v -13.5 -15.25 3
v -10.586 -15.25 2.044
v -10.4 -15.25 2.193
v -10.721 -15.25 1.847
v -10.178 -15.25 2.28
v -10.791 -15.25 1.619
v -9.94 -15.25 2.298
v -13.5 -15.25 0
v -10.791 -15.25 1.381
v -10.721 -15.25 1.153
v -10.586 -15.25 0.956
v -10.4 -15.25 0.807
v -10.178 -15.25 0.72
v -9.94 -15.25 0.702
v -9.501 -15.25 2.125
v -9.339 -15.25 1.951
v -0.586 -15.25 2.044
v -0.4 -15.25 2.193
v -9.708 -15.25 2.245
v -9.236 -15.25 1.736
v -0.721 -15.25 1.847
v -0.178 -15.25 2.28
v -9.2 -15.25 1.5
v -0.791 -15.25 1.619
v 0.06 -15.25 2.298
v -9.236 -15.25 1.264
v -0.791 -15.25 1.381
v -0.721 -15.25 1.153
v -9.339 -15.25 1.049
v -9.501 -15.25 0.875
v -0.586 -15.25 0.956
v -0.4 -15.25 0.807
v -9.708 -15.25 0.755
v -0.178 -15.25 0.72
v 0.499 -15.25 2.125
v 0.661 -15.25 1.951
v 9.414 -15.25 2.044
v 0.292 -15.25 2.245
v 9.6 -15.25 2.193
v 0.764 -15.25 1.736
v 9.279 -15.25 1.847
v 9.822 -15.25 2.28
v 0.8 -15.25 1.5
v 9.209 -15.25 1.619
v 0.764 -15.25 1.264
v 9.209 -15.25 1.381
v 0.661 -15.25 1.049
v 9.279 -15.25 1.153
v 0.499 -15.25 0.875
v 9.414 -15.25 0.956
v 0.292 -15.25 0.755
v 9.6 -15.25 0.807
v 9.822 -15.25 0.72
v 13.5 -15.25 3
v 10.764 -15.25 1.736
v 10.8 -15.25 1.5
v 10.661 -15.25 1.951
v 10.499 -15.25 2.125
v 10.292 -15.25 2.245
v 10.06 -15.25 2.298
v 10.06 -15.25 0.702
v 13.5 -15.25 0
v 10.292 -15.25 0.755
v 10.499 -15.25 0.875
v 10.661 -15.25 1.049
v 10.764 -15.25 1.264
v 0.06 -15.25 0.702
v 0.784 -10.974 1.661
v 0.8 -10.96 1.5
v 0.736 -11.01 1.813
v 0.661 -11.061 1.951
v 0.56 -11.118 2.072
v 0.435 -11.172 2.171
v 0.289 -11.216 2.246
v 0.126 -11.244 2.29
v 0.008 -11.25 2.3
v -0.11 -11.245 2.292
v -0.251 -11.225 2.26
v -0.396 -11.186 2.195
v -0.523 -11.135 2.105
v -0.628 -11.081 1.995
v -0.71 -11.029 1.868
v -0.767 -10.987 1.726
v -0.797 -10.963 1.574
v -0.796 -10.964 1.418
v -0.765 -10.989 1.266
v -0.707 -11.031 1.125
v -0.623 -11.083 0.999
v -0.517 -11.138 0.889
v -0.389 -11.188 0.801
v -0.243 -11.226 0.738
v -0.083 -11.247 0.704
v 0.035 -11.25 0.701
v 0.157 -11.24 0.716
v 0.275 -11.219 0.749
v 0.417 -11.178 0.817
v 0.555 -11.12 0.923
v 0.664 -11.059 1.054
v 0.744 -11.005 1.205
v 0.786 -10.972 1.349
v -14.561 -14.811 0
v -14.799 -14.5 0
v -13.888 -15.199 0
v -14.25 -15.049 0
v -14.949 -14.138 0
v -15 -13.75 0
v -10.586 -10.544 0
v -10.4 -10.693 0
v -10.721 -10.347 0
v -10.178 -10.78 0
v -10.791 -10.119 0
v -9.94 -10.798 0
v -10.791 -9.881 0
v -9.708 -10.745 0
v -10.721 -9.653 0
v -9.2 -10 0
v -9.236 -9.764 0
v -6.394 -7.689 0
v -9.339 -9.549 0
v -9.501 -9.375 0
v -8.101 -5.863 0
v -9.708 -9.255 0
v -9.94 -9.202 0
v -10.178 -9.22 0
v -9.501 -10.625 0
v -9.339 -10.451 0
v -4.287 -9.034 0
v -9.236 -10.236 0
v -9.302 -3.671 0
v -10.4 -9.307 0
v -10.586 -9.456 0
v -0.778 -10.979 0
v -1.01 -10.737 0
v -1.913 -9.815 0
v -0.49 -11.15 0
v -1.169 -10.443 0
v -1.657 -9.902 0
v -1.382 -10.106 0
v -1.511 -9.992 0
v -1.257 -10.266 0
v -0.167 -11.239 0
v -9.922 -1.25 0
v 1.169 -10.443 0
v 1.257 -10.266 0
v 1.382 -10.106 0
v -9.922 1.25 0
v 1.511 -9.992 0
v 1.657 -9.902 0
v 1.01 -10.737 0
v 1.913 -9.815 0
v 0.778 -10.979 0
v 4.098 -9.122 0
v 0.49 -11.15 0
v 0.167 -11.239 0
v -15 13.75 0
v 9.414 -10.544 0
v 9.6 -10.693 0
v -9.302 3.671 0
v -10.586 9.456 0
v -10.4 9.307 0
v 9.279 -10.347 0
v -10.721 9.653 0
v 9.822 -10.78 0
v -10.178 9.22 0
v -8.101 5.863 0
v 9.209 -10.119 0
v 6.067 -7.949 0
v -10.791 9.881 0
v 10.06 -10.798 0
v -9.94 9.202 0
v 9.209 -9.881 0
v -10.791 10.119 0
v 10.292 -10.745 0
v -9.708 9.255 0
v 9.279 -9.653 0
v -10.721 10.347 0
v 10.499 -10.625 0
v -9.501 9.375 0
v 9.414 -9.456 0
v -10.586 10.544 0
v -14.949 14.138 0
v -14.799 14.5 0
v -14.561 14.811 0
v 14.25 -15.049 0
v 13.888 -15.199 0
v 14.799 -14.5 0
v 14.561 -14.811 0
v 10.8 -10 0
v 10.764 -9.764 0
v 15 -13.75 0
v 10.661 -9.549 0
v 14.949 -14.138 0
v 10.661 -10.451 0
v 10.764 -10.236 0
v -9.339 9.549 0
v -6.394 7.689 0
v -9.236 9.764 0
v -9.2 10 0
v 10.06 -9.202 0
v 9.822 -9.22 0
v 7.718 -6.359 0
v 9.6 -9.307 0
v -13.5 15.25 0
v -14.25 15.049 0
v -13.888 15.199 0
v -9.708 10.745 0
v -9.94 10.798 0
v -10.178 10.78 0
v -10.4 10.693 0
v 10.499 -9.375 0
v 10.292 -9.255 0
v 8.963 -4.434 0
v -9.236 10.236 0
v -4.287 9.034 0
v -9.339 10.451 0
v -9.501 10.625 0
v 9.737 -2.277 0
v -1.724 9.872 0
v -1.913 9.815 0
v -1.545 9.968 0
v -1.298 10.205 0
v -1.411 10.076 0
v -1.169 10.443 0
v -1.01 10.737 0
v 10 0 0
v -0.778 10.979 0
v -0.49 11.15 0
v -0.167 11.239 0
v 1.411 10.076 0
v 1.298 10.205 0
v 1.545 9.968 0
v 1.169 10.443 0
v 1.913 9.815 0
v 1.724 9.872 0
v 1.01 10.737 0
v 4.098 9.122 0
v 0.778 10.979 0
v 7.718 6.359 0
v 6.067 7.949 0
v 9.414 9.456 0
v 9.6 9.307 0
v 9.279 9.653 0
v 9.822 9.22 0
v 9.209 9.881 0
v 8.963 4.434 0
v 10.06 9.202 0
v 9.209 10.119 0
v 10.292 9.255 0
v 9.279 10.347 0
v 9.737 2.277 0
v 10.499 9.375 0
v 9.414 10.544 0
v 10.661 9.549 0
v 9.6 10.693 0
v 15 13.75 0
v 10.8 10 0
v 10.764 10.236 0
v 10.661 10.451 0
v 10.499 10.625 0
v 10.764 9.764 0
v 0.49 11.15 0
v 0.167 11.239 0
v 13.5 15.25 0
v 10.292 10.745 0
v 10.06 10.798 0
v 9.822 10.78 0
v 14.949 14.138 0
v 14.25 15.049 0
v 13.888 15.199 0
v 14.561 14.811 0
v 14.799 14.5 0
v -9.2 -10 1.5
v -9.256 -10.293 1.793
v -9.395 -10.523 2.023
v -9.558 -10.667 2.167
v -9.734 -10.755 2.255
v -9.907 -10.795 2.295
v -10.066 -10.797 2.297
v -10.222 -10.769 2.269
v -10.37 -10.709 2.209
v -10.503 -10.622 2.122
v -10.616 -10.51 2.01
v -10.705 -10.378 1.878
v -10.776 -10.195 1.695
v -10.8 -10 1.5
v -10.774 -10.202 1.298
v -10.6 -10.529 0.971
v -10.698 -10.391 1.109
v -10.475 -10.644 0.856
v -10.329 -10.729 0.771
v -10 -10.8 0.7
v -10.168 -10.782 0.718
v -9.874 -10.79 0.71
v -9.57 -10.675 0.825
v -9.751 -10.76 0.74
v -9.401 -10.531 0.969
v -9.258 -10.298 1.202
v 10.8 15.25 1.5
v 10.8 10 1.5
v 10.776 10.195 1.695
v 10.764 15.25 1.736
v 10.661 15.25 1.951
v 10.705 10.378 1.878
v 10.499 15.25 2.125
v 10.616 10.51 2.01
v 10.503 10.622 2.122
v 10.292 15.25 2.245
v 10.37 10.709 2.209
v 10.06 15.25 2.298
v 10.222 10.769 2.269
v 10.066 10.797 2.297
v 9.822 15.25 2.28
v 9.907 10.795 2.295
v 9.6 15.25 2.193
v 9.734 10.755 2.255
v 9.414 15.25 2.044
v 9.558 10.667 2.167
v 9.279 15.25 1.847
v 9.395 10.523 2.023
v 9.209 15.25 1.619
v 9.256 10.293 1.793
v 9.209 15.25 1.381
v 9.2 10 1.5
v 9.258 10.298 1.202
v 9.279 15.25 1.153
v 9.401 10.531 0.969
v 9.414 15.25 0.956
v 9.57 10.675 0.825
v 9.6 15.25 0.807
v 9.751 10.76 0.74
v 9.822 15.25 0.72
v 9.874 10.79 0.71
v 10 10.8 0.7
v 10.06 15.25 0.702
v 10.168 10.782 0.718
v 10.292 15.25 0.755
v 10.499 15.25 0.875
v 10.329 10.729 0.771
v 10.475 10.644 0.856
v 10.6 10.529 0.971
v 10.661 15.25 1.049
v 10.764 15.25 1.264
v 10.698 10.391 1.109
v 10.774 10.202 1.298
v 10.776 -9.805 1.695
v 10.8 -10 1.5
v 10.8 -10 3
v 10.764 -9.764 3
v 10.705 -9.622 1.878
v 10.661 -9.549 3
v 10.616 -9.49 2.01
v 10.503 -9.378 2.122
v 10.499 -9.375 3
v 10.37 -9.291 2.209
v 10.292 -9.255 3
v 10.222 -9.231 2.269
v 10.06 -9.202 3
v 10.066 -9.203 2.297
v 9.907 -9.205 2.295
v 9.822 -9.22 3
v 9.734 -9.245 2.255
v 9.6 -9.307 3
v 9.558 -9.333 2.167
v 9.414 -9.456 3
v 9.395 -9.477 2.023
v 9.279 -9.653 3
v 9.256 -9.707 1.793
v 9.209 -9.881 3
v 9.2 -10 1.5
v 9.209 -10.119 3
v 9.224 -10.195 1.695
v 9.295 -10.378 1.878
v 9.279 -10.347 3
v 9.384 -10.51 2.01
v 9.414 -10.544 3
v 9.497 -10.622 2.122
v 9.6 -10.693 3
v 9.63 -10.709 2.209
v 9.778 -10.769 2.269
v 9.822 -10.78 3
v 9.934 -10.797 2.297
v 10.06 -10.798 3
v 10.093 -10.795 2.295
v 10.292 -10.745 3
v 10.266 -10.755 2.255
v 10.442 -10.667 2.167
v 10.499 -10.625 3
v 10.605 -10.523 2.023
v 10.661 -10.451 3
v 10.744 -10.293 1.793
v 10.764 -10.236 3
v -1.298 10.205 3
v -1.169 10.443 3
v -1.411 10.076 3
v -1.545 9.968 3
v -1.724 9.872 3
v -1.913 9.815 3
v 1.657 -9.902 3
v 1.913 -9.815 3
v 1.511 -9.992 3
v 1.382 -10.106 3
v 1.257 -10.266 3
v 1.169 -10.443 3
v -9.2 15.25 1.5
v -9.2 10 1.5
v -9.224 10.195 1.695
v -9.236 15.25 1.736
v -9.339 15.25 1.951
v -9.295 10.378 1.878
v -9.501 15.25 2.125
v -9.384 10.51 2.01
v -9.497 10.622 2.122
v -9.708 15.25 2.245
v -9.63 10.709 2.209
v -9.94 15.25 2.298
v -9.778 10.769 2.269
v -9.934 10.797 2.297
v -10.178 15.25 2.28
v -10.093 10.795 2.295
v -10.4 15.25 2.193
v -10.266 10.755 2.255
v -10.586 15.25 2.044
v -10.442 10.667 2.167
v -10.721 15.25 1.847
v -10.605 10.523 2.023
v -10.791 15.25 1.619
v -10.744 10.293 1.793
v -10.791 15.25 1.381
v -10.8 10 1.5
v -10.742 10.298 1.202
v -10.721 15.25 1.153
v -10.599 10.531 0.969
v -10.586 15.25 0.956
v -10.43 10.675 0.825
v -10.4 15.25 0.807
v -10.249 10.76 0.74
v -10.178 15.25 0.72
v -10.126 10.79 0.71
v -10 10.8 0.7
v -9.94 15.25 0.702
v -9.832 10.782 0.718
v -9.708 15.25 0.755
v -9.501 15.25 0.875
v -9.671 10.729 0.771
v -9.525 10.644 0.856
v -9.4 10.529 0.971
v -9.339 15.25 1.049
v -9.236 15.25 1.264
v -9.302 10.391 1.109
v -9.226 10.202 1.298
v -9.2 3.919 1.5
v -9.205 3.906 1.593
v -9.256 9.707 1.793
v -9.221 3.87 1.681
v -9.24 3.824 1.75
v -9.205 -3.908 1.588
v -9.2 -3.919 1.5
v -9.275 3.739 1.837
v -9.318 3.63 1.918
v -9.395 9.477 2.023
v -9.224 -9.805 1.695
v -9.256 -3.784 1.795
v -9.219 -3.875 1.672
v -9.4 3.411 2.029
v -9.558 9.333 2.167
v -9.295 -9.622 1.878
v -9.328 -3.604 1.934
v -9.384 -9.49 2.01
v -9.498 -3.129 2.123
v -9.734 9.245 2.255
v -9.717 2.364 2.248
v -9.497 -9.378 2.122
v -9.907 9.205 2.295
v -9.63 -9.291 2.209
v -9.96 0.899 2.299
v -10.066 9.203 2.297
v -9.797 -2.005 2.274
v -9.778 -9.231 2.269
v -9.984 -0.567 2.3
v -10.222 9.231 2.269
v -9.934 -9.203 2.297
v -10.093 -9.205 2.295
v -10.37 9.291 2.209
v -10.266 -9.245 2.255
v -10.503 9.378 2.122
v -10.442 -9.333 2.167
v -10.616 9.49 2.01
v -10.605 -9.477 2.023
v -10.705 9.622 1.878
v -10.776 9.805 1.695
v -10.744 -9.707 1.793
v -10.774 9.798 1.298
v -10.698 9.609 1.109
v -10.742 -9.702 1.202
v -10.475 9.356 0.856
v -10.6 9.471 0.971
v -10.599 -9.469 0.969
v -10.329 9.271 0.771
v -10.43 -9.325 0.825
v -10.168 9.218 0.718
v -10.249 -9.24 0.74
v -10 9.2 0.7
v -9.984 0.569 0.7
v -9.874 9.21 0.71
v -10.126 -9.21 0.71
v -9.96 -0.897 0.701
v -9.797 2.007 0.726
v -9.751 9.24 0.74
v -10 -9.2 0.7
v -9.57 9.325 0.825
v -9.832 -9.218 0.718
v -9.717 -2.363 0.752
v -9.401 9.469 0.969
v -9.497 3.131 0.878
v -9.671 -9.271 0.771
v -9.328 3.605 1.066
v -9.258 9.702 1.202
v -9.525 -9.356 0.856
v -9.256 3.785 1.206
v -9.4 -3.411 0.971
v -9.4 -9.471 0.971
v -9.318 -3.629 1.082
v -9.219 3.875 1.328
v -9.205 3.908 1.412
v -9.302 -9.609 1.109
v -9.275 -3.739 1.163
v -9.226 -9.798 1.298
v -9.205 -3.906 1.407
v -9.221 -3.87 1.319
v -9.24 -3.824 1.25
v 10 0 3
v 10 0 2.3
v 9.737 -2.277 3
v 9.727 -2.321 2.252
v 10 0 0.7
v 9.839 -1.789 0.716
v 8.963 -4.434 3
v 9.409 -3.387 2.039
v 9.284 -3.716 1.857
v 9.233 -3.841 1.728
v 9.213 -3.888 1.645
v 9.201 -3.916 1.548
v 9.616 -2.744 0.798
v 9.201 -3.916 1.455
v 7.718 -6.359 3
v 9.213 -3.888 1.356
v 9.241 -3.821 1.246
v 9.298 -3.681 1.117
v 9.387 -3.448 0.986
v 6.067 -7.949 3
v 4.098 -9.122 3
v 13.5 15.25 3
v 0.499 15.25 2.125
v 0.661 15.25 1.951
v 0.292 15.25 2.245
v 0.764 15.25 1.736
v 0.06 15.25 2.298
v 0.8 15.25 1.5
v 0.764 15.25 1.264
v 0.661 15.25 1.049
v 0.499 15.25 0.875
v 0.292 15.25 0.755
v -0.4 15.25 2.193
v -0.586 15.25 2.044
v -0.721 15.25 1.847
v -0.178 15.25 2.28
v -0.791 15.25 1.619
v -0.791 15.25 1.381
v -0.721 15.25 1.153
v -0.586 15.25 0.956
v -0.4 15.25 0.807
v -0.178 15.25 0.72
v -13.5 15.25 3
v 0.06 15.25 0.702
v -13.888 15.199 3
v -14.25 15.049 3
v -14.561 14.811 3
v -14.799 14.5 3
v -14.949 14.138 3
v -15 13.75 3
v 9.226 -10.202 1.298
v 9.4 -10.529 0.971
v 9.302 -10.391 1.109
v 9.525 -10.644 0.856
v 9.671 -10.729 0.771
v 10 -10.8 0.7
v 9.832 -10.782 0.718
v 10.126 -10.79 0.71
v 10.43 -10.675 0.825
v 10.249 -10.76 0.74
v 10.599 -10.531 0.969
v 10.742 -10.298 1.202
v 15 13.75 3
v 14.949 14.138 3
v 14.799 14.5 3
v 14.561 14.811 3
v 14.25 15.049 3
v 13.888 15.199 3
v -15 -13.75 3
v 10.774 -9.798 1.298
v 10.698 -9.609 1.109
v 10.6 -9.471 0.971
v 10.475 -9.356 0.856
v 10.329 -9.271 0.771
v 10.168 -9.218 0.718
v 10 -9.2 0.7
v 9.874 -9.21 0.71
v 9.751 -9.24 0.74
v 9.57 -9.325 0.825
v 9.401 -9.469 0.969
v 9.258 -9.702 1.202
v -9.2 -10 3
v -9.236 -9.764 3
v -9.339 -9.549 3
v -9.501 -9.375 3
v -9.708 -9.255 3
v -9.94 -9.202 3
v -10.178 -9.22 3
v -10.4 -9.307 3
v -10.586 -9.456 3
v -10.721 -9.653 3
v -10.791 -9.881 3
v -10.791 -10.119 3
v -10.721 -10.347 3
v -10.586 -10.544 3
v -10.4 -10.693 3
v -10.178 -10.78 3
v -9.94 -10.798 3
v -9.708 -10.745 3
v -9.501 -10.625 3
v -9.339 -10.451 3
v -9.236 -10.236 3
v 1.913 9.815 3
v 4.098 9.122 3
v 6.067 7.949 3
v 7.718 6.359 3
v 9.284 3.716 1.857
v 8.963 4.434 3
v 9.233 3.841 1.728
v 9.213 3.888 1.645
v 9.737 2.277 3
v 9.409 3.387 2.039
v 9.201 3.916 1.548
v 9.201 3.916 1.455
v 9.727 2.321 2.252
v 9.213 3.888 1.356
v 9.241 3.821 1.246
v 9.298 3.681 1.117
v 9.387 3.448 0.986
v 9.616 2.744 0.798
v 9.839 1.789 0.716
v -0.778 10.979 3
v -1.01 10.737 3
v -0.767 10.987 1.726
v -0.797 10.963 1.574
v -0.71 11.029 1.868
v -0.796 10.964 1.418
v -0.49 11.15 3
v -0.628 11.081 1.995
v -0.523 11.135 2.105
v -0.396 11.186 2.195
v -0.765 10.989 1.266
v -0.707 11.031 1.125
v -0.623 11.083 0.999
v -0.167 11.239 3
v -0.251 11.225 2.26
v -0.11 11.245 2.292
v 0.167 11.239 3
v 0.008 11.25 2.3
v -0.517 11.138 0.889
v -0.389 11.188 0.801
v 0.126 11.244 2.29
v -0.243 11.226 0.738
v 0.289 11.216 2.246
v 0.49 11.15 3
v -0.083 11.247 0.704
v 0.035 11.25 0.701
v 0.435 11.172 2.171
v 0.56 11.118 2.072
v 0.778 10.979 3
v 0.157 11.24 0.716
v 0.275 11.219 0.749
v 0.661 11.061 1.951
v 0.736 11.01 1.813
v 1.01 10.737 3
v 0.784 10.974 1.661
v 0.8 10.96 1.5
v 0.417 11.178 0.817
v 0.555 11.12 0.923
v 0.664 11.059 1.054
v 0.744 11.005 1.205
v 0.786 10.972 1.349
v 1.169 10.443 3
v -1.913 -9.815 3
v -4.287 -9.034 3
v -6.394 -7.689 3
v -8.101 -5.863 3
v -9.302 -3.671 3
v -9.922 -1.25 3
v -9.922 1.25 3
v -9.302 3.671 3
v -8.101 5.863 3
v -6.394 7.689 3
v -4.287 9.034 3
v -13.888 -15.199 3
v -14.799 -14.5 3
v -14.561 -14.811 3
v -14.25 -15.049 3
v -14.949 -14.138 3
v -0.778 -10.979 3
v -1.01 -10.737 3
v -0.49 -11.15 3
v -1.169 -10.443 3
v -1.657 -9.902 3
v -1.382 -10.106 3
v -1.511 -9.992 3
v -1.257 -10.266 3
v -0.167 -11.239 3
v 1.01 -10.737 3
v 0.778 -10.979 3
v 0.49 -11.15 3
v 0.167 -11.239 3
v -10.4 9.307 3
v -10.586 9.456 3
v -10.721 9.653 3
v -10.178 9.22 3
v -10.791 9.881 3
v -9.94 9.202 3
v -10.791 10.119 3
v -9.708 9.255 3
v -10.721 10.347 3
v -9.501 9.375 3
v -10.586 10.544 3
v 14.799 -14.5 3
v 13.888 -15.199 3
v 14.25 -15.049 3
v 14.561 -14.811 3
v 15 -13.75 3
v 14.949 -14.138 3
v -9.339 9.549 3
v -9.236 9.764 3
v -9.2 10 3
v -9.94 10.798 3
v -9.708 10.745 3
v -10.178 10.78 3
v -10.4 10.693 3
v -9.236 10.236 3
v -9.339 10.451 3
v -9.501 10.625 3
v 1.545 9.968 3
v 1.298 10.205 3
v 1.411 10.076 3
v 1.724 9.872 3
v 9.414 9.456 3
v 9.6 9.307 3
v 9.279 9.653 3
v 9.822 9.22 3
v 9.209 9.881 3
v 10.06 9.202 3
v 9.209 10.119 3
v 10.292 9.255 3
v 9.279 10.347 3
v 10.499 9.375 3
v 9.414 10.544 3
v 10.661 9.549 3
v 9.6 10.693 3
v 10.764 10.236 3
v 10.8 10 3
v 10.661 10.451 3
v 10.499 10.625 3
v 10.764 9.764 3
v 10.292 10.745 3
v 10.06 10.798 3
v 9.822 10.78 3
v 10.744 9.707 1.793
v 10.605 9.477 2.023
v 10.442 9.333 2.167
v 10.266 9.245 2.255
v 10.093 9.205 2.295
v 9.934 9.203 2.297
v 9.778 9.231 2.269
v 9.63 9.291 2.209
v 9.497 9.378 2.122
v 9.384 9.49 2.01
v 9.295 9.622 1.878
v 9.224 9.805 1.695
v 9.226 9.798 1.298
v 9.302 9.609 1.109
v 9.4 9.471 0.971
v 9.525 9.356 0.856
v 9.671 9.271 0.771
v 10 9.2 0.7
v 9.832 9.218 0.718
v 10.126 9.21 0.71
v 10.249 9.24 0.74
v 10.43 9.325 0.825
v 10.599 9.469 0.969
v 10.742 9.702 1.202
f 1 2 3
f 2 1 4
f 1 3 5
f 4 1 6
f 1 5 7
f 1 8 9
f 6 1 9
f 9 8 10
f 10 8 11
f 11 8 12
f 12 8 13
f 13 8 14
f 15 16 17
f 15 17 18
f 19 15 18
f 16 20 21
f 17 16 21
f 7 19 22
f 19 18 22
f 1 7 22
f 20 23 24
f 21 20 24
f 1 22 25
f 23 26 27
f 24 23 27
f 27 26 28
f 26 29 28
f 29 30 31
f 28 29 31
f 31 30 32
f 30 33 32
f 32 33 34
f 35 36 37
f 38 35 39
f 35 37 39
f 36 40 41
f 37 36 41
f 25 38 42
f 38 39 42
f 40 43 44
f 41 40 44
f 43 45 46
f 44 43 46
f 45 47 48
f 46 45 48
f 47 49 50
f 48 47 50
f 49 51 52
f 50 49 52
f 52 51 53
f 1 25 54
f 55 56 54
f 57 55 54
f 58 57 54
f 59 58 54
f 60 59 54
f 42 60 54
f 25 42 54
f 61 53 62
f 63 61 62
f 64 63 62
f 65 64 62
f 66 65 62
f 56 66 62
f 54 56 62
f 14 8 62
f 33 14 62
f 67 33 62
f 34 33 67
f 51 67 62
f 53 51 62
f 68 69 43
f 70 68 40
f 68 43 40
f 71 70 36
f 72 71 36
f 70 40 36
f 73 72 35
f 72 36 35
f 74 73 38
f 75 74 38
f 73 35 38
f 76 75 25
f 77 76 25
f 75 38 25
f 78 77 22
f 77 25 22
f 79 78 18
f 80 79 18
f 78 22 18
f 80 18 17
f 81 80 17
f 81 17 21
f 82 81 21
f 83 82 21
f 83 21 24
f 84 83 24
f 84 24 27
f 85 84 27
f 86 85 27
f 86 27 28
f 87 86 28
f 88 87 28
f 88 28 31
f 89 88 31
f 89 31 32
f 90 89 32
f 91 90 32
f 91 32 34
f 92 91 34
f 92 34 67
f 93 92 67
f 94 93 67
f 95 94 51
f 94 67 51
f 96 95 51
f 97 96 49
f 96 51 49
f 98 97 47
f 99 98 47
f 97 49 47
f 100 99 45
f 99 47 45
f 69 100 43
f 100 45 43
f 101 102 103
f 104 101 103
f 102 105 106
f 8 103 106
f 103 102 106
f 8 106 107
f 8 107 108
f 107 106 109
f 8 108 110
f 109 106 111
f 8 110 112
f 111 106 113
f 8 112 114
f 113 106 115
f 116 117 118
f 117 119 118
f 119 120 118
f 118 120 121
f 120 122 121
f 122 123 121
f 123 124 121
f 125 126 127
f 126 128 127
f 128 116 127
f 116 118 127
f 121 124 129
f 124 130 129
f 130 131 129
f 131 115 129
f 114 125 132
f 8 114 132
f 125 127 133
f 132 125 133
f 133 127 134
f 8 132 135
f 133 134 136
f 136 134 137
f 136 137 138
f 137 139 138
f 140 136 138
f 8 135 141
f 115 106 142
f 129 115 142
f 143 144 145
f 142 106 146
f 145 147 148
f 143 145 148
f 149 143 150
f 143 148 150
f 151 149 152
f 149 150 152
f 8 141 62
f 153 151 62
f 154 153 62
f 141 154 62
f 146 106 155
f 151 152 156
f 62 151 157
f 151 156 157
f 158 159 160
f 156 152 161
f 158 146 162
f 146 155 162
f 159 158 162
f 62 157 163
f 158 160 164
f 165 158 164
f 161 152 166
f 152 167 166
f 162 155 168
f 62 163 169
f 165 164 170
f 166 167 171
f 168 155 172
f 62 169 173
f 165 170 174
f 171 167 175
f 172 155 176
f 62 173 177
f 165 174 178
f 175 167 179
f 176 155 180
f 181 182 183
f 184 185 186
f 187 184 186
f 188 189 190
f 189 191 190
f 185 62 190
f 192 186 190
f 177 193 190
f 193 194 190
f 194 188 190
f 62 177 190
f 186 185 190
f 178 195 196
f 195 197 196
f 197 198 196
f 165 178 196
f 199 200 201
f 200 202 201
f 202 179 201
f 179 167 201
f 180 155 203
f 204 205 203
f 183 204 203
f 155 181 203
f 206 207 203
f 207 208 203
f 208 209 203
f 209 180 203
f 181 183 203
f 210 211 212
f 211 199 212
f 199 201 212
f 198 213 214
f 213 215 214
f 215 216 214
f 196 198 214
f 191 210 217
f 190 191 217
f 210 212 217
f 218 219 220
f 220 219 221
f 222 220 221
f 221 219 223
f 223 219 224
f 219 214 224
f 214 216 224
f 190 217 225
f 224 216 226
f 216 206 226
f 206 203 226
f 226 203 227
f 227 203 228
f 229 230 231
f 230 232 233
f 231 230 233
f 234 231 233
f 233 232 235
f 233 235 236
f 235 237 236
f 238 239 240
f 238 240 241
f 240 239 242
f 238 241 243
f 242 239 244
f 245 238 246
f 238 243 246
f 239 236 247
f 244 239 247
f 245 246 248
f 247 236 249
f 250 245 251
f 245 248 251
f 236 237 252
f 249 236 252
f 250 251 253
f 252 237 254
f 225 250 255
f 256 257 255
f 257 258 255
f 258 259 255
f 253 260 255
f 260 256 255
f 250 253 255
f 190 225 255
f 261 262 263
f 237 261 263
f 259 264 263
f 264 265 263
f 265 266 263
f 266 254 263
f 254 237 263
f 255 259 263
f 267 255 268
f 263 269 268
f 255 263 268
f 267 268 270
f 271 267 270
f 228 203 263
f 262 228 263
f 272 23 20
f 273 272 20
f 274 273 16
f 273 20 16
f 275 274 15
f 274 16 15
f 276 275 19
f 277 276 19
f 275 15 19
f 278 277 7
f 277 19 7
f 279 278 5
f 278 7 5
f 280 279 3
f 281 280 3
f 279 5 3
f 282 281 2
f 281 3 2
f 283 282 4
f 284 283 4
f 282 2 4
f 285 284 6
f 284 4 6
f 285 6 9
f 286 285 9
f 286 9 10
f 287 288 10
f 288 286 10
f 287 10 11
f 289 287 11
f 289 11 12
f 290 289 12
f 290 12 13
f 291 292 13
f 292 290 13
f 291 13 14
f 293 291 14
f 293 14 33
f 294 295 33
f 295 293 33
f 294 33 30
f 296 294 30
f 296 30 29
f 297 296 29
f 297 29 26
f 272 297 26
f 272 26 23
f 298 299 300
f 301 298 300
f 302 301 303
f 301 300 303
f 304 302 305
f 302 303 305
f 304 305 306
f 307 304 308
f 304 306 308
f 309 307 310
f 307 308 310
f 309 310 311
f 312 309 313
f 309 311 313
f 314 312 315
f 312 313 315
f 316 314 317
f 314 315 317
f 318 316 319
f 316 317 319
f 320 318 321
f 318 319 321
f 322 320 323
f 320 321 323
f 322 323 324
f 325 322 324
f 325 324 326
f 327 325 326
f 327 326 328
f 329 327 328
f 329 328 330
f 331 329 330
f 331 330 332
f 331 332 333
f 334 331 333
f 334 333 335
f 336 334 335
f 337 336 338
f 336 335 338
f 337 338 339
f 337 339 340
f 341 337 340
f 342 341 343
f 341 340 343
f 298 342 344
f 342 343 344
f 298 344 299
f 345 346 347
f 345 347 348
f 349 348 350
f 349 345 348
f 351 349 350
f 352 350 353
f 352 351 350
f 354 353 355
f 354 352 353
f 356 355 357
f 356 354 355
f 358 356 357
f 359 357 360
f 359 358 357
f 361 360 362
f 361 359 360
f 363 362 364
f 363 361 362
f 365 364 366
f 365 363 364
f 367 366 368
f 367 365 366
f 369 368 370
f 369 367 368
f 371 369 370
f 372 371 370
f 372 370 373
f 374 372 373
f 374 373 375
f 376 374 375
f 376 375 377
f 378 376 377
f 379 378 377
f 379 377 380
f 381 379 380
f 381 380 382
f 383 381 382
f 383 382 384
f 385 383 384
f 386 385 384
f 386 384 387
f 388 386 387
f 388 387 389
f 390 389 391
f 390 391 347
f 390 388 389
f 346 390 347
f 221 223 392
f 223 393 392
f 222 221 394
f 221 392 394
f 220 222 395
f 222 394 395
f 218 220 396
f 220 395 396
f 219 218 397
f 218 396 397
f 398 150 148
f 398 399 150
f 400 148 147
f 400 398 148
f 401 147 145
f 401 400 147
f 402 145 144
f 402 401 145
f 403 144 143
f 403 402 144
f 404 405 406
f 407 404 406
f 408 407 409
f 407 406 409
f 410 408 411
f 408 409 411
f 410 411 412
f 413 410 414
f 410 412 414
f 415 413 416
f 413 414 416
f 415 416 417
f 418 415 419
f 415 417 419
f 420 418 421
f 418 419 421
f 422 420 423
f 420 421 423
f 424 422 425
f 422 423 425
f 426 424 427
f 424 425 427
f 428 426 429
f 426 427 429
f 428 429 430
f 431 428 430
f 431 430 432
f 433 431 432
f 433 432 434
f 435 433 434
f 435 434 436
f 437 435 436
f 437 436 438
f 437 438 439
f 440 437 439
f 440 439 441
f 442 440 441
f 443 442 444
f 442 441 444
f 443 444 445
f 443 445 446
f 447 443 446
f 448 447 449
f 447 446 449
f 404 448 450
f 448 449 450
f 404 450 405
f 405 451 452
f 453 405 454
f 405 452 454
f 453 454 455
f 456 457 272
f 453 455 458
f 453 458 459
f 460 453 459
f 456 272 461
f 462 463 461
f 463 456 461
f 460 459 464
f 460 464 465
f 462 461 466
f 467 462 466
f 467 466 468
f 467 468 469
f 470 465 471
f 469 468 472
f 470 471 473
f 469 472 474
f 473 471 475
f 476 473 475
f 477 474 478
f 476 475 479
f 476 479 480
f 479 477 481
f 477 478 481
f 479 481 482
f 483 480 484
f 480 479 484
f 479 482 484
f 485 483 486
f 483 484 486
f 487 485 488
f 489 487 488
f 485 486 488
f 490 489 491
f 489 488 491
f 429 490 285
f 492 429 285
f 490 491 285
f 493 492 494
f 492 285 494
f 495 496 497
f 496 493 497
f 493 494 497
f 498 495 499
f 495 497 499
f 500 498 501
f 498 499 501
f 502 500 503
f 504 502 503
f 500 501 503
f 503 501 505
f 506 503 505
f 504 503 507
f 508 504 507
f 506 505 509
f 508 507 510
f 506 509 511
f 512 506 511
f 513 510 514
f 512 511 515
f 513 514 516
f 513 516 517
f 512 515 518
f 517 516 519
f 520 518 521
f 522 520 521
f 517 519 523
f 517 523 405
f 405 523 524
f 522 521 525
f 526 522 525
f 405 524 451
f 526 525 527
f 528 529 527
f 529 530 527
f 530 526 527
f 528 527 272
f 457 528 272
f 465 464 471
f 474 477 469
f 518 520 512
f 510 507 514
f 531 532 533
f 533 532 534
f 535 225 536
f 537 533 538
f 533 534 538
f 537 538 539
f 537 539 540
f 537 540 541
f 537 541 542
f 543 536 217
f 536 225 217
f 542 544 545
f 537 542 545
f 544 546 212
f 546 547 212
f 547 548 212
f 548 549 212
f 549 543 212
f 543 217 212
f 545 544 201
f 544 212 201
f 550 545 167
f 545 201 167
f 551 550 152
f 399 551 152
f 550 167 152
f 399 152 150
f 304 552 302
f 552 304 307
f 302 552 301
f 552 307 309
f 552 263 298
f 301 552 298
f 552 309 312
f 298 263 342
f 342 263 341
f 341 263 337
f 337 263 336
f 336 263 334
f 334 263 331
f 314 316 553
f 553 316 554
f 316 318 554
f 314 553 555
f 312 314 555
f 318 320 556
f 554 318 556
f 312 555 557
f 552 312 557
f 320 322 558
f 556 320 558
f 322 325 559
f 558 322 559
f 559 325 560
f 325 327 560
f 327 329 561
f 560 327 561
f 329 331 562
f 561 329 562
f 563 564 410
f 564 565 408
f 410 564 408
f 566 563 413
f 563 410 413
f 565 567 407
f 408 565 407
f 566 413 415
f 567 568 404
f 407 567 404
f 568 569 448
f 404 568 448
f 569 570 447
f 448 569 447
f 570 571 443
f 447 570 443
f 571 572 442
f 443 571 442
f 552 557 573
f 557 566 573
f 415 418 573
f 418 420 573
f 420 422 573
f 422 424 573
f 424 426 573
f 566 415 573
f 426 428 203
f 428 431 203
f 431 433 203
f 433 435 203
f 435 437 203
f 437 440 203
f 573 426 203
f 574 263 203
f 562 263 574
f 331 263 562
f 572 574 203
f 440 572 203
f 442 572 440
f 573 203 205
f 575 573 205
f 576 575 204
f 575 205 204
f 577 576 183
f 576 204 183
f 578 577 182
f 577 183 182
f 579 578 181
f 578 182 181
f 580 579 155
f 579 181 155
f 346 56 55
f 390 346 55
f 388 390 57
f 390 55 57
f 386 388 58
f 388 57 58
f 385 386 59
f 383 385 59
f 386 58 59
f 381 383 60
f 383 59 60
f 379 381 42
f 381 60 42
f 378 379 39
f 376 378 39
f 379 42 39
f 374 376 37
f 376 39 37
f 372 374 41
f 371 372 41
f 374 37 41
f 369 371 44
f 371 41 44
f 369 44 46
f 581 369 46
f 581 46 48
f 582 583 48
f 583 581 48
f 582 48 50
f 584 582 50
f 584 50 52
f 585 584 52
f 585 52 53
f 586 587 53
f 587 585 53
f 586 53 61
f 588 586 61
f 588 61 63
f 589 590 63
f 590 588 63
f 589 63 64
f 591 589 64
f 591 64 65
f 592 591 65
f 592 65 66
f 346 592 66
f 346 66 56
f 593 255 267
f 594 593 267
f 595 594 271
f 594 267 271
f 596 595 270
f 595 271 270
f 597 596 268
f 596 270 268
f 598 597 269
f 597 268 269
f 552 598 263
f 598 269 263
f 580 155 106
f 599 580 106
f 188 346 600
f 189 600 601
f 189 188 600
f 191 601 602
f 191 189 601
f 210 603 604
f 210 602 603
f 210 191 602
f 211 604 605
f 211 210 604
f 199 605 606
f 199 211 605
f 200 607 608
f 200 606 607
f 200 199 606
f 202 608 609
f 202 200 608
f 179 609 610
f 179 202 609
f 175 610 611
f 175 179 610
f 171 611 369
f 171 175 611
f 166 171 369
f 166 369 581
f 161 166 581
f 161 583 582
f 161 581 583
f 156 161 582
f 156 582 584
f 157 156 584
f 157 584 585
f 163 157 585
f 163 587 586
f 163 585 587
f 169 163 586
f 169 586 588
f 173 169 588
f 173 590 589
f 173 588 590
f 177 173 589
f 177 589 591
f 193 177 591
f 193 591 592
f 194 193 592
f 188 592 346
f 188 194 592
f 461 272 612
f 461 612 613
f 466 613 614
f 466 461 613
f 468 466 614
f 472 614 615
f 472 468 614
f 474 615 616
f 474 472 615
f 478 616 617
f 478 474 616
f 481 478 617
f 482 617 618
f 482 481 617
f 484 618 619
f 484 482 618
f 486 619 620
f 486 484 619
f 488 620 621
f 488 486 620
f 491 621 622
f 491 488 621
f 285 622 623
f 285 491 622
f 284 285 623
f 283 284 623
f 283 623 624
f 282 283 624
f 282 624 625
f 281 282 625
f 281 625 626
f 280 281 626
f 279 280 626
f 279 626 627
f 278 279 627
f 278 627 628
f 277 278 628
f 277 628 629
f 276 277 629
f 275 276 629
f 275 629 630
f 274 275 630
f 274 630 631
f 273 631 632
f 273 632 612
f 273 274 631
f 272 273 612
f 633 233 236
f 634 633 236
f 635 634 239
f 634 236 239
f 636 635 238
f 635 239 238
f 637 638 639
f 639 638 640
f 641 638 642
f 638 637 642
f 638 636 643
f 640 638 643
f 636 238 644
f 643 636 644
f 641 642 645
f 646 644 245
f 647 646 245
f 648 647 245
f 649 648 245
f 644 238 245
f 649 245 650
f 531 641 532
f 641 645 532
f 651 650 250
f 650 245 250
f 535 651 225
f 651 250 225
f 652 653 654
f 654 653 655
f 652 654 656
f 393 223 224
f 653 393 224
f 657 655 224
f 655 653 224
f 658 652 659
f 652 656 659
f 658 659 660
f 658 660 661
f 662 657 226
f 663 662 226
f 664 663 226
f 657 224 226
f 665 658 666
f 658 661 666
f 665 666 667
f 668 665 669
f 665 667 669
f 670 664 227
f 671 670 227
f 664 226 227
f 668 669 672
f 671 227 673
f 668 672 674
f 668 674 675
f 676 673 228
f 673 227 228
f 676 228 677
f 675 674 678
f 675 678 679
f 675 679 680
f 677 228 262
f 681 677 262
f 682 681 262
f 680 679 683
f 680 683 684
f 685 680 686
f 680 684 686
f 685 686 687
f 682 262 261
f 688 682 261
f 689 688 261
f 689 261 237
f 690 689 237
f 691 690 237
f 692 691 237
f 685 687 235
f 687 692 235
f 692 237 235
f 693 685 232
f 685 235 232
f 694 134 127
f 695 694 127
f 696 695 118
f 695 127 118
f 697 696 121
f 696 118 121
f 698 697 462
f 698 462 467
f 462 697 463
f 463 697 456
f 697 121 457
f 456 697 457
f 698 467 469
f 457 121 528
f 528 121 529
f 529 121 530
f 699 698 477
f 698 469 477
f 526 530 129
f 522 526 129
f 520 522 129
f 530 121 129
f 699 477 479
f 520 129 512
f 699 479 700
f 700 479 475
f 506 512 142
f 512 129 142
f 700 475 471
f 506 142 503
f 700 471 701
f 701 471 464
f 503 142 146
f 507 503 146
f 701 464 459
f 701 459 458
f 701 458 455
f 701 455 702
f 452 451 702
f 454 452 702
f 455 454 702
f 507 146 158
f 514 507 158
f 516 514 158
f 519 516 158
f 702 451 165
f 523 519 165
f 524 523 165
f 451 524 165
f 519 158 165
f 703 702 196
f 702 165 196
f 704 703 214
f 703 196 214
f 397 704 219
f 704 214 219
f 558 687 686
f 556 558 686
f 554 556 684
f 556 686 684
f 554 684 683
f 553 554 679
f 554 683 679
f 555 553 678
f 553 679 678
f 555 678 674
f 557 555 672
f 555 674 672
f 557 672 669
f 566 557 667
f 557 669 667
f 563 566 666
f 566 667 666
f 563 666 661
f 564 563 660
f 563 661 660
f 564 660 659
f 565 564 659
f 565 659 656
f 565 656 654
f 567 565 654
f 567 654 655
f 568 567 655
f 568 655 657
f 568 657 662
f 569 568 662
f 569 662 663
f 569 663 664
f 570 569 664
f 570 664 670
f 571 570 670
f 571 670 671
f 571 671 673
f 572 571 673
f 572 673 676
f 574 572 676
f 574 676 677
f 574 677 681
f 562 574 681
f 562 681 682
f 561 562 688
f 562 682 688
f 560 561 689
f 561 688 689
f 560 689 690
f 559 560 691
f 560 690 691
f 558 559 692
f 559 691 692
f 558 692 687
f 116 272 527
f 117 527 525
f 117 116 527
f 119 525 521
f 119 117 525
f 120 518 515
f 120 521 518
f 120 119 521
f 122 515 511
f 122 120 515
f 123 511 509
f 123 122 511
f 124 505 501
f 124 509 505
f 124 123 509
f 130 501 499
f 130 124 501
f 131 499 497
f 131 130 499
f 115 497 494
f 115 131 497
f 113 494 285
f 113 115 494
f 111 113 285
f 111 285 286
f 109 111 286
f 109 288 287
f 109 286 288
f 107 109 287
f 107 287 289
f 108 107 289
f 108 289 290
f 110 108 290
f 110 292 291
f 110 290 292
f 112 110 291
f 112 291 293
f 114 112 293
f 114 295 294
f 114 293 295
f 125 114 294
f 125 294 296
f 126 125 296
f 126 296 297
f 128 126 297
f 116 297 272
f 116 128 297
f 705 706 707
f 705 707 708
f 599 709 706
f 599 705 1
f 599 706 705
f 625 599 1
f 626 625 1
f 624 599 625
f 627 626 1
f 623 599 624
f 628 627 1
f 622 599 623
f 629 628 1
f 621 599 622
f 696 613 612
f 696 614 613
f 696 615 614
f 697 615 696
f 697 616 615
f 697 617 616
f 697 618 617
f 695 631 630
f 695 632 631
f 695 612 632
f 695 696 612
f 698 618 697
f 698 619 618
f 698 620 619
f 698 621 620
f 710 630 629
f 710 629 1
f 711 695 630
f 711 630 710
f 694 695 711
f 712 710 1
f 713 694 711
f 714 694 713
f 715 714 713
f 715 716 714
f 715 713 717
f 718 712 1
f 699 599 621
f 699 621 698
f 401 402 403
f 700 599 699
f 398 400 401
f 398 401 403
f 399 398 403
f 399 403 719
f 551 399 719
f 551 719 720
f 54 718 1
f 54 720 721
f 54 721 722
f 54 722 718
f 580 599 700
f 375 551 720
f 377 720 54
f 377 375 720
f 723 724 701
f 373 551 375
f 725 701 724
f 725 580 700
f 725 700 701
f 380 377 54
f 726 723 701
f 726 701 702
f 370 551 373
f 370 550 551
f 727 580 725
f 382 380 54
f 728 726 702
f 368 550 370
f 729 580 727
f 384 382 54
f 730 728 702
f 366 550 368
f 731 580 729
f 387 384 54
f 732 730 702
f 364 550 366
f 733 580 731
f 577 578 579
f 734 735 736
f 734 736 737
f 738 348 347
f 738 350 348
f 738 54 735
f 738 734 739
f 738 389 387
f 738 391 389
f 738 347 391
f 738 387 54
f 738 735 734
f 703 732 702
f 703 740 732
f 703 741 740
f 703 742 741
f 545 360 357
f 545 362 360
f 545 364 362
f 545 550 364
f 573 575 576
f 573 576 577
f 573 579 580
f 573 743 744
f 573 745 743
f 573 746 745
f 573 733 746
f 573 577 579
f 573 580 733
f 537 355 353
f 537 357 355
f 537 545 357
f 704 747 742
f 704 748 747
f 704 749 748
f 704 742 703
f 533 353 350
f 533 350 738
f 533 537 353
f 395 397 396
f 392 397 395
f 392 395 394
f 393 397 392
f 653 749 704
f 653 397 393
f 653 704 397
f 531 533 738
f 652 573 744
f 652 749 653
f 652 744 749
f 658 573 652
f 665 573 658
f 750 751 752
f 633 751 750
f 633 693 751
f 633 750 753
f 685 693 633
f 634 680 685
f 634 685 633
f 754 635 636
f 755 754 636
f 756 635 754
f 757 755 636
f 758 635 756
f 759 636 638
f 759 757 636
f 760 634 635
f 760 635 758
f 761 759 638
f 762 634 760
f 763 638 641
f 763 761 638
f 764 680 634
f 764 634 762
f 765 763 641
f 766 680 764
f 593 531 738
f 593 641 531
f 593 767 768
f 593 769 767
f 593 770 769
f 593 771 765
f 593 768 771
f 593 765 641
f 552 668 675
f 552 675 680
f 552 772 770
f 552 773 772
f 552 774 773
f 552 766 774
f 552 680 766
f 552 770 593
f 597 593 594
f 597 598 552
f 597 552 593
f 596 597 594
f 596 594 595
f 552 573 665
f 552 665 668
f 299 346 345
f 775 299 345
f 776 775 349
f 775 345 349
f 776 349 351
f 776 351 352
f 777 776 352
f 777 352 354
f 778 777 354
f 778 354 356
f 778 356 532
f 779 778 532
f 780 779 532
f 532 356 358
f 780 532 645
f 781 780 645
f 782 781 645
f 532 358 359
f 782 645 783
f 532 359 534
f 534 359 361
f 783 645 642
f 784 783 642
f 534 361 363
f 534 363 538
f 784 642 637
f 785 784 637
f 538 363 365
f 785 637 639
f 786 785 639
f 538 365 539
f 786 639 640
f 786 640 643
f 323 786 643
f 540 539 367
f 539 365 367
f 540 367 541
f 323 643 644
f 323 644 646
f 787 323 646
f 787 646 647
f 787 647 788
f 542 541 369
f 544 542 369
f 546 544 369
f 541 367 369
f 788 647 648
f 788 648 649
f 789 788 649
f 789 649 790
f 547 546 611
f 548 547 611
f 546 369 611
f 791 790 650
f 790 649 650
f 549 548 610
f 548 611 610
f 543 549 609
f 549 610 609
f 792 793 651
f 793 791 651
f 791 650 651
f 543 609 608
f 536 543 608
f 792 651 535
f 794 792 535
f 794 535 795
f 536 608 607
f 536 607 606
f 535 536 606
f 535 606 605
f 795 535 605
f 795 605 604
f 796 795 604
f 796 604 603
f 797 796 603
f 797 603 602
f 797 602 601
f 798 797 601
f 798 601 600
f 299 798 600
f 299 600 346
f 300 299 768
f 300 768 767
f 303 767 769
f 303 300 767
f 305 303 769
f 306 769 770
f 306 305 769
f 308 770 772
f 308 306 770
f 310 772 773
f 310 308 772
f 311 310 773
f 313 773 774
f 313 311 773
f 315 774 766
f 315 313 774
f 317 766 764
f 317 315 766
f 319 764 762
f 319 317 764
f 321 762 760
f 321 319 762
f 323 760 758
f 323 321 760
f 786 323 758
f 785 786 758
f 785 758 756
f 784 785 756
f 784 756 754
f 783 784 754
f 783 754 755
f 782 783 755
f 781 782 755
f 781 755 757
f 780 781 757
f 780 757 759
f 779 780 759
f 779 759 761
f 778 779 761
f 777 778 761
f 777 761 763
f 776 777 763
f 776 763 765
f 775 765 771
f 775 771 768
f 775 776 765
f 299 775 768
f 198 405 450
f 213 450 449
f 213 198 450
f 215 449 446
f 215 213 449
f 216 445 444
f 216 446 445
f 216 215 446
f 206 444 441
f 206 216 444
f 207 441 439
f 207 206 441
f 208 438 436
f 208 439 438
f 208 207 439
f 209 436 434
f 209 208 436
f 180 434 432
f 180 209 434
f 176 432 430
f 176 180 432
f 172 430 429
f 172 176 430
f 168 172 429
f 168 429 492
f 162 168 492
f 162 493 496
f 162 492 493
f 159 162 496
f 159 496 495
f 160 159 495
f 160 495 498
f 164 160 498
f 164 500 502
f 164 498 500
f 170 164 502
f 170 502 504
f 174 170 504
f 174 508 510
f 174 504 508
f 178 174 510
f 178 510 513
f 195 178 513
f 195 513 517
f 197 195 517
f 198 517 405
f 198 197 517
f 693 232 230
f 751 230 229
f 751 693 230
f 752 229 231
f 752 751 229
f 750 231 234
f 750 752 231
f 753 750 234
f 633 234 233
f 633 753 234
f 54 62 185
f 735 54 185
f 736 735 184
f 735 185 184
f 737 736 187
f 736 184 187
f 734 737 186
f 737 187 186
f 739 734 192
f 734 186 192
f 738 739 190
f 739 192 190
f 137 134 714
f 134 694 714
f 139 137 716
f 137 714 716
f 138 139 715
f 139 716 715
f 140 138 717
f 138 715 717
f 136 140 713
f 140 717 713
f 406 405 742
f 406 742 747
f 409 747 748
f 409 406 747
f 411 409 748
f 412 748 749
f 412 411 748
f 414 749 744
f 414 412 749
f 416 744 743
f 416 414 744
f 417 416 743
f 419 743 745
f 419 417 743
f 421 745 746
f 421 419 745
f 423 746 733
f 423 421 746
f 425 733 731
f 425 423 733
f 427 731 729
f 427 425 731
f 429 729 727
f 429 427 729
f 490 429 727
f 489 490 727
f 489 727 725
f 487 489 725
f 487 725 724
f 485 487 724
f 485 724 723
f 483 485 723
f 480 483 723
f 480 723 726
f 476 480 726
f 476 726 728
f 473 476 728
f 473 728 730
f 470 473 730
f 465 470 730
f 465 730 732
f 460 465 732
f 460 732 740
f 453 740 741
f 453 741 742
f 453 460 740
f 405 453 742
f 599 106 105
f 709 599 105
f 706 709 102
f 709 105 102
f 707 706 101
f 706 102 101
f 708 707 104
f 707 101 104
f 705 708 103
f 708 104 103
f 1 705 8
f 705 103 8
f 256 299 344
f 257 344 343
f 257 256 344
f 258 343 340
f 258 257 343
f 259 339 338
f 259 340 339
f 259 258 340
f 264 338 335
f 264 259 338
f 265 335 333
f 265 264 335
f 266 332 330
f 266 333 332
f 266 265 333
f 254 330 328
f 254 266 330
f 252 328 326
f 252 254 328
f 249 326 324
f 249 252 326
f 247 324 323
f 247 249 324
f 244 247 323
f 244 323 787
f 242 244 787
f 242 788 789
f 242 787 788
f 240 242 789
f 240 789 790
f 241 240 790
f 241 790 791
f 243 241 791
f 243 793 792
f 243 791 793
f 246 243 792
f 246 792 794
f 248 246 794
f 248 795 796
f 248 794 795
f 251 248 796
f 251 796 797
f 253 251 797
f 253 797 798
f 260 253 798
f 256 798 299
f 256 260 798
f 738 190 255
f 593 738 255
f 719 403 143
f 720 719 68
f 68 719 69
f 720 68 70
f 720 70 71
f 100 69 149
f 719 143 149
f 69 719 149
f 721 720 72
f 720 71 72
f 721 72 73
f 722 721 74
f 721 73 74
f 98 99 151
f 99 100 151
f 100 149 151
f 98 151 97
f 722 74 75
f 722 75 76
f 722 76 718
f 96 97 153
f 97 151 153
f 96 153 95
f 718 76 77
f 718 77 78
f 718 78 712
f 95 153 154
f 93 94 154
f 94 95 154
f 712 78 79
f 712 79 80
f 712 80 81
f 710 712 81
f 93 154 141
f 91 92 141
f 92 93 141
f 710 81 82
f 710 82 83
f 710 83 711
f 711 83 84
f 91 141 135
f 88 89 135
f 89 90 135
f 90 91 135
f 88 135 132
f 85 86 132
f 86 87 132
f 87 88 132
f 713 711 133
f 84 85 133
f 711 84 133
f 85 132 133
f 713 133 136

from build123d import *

# Parameters (mm, degrees)
F0_R     = 0.8
F1_DEPTH = 3
F2_R     = 0.8
F3_DEPTH = 30.501
F4_R     = 1


with BuildPart() as f1:
    # F0 (on Top) → F1 (new body)
    with BuildSketch(Plane.XY):
        with BuildLine():
            Line((13.5, 15.25), (-13.5, 15.25))
            ThreePointArc((-13.5, 15.25), (-14.56066, 14.81066), (-15, 13.75))
            Line((-15, 13.75), (-15, -13.75))
            ThreePointArc((-15, -13.75), (-14.56066, -14.81066), (-13.5, -15.25))
            Line((-13.5, -15.25), (13.5, -15.25))
            ThreePointArc((13.5, -15.25), (14.56066, -14.81066), (15, -13.75))
            Line((15, -13.75), (15, 13.75))
            ThreePointArc((15, 13.75), (14.56066, 14.81066), (13.5, 15.25))
        make_face()
        with Locations((-10, -10)):
            Circle(F0_R, mode=Mode.SUBTRACT)
        with Locations((10, -10)):
            Circle(F0_R, mode=Mode.SUBTRACT)
        with Locations((-10, 10)):
            Circle(F0_R, mode=Mode.SUBTRACT)
        with BuildLine():
            ThreePointArc((1.25, 9.921567), (7.5, 6.614378), (10, 0))
            ThreePointArc((10, 0), (7.5, -6.614378), (1.25, -9.921567))
            Line((1.25, -9.921567), (1.25, -10))
            ThreePointArc((1.25, -10), (0, -11.25), (-1.25, -10))
            Line((-1.25, -10), (-1.25, -9.921567))
            ThreePointArc((-1.25, -9.921567), (-10, 0), (-1.25, 9.921567))
            Line((-1.25, 9.921567), (-1.25, 10))
            ThreePointArc((-1.25, 10), (0, 11.25), (1.25, 10))
            Line((1.25, 10), (1.25, 9.921567))
        make_face(mode=Mode.SUBTRACT)
        with Locations((10, 10)):
            Circle(F0_R, mode=Mode.SUBTRACT)
    extrude(amount=F1_DEPTH)

    # F2 (on face) → F3 (cut, through all)
    with BuildSketch(Plane.XZ.offset(15.25)):
        with Locations((0, 1.5)):
            Circle(F2_R)
        with Locations((10, 1.5)):
            Circle(F2_R)
        with Locations((-10, 1.5)):
            Circle(F2_R)
    extrude(amount=-F3_DEPTH, mode=Mode.SUBTRACT)

    # F4
    f4_edges = [f1.edges().sort_by_distance(p)[0] for p in [
        (1.25, 9.921567, 1.5),
        (-1.25, 9.921567, 1.5),
        (-1.25, -9.921567, 1.5),
        (1.25, -9.921567, 1.5),
    ]]
    fillet(f4_edges, radius=F4_R)


solid = f1.part
